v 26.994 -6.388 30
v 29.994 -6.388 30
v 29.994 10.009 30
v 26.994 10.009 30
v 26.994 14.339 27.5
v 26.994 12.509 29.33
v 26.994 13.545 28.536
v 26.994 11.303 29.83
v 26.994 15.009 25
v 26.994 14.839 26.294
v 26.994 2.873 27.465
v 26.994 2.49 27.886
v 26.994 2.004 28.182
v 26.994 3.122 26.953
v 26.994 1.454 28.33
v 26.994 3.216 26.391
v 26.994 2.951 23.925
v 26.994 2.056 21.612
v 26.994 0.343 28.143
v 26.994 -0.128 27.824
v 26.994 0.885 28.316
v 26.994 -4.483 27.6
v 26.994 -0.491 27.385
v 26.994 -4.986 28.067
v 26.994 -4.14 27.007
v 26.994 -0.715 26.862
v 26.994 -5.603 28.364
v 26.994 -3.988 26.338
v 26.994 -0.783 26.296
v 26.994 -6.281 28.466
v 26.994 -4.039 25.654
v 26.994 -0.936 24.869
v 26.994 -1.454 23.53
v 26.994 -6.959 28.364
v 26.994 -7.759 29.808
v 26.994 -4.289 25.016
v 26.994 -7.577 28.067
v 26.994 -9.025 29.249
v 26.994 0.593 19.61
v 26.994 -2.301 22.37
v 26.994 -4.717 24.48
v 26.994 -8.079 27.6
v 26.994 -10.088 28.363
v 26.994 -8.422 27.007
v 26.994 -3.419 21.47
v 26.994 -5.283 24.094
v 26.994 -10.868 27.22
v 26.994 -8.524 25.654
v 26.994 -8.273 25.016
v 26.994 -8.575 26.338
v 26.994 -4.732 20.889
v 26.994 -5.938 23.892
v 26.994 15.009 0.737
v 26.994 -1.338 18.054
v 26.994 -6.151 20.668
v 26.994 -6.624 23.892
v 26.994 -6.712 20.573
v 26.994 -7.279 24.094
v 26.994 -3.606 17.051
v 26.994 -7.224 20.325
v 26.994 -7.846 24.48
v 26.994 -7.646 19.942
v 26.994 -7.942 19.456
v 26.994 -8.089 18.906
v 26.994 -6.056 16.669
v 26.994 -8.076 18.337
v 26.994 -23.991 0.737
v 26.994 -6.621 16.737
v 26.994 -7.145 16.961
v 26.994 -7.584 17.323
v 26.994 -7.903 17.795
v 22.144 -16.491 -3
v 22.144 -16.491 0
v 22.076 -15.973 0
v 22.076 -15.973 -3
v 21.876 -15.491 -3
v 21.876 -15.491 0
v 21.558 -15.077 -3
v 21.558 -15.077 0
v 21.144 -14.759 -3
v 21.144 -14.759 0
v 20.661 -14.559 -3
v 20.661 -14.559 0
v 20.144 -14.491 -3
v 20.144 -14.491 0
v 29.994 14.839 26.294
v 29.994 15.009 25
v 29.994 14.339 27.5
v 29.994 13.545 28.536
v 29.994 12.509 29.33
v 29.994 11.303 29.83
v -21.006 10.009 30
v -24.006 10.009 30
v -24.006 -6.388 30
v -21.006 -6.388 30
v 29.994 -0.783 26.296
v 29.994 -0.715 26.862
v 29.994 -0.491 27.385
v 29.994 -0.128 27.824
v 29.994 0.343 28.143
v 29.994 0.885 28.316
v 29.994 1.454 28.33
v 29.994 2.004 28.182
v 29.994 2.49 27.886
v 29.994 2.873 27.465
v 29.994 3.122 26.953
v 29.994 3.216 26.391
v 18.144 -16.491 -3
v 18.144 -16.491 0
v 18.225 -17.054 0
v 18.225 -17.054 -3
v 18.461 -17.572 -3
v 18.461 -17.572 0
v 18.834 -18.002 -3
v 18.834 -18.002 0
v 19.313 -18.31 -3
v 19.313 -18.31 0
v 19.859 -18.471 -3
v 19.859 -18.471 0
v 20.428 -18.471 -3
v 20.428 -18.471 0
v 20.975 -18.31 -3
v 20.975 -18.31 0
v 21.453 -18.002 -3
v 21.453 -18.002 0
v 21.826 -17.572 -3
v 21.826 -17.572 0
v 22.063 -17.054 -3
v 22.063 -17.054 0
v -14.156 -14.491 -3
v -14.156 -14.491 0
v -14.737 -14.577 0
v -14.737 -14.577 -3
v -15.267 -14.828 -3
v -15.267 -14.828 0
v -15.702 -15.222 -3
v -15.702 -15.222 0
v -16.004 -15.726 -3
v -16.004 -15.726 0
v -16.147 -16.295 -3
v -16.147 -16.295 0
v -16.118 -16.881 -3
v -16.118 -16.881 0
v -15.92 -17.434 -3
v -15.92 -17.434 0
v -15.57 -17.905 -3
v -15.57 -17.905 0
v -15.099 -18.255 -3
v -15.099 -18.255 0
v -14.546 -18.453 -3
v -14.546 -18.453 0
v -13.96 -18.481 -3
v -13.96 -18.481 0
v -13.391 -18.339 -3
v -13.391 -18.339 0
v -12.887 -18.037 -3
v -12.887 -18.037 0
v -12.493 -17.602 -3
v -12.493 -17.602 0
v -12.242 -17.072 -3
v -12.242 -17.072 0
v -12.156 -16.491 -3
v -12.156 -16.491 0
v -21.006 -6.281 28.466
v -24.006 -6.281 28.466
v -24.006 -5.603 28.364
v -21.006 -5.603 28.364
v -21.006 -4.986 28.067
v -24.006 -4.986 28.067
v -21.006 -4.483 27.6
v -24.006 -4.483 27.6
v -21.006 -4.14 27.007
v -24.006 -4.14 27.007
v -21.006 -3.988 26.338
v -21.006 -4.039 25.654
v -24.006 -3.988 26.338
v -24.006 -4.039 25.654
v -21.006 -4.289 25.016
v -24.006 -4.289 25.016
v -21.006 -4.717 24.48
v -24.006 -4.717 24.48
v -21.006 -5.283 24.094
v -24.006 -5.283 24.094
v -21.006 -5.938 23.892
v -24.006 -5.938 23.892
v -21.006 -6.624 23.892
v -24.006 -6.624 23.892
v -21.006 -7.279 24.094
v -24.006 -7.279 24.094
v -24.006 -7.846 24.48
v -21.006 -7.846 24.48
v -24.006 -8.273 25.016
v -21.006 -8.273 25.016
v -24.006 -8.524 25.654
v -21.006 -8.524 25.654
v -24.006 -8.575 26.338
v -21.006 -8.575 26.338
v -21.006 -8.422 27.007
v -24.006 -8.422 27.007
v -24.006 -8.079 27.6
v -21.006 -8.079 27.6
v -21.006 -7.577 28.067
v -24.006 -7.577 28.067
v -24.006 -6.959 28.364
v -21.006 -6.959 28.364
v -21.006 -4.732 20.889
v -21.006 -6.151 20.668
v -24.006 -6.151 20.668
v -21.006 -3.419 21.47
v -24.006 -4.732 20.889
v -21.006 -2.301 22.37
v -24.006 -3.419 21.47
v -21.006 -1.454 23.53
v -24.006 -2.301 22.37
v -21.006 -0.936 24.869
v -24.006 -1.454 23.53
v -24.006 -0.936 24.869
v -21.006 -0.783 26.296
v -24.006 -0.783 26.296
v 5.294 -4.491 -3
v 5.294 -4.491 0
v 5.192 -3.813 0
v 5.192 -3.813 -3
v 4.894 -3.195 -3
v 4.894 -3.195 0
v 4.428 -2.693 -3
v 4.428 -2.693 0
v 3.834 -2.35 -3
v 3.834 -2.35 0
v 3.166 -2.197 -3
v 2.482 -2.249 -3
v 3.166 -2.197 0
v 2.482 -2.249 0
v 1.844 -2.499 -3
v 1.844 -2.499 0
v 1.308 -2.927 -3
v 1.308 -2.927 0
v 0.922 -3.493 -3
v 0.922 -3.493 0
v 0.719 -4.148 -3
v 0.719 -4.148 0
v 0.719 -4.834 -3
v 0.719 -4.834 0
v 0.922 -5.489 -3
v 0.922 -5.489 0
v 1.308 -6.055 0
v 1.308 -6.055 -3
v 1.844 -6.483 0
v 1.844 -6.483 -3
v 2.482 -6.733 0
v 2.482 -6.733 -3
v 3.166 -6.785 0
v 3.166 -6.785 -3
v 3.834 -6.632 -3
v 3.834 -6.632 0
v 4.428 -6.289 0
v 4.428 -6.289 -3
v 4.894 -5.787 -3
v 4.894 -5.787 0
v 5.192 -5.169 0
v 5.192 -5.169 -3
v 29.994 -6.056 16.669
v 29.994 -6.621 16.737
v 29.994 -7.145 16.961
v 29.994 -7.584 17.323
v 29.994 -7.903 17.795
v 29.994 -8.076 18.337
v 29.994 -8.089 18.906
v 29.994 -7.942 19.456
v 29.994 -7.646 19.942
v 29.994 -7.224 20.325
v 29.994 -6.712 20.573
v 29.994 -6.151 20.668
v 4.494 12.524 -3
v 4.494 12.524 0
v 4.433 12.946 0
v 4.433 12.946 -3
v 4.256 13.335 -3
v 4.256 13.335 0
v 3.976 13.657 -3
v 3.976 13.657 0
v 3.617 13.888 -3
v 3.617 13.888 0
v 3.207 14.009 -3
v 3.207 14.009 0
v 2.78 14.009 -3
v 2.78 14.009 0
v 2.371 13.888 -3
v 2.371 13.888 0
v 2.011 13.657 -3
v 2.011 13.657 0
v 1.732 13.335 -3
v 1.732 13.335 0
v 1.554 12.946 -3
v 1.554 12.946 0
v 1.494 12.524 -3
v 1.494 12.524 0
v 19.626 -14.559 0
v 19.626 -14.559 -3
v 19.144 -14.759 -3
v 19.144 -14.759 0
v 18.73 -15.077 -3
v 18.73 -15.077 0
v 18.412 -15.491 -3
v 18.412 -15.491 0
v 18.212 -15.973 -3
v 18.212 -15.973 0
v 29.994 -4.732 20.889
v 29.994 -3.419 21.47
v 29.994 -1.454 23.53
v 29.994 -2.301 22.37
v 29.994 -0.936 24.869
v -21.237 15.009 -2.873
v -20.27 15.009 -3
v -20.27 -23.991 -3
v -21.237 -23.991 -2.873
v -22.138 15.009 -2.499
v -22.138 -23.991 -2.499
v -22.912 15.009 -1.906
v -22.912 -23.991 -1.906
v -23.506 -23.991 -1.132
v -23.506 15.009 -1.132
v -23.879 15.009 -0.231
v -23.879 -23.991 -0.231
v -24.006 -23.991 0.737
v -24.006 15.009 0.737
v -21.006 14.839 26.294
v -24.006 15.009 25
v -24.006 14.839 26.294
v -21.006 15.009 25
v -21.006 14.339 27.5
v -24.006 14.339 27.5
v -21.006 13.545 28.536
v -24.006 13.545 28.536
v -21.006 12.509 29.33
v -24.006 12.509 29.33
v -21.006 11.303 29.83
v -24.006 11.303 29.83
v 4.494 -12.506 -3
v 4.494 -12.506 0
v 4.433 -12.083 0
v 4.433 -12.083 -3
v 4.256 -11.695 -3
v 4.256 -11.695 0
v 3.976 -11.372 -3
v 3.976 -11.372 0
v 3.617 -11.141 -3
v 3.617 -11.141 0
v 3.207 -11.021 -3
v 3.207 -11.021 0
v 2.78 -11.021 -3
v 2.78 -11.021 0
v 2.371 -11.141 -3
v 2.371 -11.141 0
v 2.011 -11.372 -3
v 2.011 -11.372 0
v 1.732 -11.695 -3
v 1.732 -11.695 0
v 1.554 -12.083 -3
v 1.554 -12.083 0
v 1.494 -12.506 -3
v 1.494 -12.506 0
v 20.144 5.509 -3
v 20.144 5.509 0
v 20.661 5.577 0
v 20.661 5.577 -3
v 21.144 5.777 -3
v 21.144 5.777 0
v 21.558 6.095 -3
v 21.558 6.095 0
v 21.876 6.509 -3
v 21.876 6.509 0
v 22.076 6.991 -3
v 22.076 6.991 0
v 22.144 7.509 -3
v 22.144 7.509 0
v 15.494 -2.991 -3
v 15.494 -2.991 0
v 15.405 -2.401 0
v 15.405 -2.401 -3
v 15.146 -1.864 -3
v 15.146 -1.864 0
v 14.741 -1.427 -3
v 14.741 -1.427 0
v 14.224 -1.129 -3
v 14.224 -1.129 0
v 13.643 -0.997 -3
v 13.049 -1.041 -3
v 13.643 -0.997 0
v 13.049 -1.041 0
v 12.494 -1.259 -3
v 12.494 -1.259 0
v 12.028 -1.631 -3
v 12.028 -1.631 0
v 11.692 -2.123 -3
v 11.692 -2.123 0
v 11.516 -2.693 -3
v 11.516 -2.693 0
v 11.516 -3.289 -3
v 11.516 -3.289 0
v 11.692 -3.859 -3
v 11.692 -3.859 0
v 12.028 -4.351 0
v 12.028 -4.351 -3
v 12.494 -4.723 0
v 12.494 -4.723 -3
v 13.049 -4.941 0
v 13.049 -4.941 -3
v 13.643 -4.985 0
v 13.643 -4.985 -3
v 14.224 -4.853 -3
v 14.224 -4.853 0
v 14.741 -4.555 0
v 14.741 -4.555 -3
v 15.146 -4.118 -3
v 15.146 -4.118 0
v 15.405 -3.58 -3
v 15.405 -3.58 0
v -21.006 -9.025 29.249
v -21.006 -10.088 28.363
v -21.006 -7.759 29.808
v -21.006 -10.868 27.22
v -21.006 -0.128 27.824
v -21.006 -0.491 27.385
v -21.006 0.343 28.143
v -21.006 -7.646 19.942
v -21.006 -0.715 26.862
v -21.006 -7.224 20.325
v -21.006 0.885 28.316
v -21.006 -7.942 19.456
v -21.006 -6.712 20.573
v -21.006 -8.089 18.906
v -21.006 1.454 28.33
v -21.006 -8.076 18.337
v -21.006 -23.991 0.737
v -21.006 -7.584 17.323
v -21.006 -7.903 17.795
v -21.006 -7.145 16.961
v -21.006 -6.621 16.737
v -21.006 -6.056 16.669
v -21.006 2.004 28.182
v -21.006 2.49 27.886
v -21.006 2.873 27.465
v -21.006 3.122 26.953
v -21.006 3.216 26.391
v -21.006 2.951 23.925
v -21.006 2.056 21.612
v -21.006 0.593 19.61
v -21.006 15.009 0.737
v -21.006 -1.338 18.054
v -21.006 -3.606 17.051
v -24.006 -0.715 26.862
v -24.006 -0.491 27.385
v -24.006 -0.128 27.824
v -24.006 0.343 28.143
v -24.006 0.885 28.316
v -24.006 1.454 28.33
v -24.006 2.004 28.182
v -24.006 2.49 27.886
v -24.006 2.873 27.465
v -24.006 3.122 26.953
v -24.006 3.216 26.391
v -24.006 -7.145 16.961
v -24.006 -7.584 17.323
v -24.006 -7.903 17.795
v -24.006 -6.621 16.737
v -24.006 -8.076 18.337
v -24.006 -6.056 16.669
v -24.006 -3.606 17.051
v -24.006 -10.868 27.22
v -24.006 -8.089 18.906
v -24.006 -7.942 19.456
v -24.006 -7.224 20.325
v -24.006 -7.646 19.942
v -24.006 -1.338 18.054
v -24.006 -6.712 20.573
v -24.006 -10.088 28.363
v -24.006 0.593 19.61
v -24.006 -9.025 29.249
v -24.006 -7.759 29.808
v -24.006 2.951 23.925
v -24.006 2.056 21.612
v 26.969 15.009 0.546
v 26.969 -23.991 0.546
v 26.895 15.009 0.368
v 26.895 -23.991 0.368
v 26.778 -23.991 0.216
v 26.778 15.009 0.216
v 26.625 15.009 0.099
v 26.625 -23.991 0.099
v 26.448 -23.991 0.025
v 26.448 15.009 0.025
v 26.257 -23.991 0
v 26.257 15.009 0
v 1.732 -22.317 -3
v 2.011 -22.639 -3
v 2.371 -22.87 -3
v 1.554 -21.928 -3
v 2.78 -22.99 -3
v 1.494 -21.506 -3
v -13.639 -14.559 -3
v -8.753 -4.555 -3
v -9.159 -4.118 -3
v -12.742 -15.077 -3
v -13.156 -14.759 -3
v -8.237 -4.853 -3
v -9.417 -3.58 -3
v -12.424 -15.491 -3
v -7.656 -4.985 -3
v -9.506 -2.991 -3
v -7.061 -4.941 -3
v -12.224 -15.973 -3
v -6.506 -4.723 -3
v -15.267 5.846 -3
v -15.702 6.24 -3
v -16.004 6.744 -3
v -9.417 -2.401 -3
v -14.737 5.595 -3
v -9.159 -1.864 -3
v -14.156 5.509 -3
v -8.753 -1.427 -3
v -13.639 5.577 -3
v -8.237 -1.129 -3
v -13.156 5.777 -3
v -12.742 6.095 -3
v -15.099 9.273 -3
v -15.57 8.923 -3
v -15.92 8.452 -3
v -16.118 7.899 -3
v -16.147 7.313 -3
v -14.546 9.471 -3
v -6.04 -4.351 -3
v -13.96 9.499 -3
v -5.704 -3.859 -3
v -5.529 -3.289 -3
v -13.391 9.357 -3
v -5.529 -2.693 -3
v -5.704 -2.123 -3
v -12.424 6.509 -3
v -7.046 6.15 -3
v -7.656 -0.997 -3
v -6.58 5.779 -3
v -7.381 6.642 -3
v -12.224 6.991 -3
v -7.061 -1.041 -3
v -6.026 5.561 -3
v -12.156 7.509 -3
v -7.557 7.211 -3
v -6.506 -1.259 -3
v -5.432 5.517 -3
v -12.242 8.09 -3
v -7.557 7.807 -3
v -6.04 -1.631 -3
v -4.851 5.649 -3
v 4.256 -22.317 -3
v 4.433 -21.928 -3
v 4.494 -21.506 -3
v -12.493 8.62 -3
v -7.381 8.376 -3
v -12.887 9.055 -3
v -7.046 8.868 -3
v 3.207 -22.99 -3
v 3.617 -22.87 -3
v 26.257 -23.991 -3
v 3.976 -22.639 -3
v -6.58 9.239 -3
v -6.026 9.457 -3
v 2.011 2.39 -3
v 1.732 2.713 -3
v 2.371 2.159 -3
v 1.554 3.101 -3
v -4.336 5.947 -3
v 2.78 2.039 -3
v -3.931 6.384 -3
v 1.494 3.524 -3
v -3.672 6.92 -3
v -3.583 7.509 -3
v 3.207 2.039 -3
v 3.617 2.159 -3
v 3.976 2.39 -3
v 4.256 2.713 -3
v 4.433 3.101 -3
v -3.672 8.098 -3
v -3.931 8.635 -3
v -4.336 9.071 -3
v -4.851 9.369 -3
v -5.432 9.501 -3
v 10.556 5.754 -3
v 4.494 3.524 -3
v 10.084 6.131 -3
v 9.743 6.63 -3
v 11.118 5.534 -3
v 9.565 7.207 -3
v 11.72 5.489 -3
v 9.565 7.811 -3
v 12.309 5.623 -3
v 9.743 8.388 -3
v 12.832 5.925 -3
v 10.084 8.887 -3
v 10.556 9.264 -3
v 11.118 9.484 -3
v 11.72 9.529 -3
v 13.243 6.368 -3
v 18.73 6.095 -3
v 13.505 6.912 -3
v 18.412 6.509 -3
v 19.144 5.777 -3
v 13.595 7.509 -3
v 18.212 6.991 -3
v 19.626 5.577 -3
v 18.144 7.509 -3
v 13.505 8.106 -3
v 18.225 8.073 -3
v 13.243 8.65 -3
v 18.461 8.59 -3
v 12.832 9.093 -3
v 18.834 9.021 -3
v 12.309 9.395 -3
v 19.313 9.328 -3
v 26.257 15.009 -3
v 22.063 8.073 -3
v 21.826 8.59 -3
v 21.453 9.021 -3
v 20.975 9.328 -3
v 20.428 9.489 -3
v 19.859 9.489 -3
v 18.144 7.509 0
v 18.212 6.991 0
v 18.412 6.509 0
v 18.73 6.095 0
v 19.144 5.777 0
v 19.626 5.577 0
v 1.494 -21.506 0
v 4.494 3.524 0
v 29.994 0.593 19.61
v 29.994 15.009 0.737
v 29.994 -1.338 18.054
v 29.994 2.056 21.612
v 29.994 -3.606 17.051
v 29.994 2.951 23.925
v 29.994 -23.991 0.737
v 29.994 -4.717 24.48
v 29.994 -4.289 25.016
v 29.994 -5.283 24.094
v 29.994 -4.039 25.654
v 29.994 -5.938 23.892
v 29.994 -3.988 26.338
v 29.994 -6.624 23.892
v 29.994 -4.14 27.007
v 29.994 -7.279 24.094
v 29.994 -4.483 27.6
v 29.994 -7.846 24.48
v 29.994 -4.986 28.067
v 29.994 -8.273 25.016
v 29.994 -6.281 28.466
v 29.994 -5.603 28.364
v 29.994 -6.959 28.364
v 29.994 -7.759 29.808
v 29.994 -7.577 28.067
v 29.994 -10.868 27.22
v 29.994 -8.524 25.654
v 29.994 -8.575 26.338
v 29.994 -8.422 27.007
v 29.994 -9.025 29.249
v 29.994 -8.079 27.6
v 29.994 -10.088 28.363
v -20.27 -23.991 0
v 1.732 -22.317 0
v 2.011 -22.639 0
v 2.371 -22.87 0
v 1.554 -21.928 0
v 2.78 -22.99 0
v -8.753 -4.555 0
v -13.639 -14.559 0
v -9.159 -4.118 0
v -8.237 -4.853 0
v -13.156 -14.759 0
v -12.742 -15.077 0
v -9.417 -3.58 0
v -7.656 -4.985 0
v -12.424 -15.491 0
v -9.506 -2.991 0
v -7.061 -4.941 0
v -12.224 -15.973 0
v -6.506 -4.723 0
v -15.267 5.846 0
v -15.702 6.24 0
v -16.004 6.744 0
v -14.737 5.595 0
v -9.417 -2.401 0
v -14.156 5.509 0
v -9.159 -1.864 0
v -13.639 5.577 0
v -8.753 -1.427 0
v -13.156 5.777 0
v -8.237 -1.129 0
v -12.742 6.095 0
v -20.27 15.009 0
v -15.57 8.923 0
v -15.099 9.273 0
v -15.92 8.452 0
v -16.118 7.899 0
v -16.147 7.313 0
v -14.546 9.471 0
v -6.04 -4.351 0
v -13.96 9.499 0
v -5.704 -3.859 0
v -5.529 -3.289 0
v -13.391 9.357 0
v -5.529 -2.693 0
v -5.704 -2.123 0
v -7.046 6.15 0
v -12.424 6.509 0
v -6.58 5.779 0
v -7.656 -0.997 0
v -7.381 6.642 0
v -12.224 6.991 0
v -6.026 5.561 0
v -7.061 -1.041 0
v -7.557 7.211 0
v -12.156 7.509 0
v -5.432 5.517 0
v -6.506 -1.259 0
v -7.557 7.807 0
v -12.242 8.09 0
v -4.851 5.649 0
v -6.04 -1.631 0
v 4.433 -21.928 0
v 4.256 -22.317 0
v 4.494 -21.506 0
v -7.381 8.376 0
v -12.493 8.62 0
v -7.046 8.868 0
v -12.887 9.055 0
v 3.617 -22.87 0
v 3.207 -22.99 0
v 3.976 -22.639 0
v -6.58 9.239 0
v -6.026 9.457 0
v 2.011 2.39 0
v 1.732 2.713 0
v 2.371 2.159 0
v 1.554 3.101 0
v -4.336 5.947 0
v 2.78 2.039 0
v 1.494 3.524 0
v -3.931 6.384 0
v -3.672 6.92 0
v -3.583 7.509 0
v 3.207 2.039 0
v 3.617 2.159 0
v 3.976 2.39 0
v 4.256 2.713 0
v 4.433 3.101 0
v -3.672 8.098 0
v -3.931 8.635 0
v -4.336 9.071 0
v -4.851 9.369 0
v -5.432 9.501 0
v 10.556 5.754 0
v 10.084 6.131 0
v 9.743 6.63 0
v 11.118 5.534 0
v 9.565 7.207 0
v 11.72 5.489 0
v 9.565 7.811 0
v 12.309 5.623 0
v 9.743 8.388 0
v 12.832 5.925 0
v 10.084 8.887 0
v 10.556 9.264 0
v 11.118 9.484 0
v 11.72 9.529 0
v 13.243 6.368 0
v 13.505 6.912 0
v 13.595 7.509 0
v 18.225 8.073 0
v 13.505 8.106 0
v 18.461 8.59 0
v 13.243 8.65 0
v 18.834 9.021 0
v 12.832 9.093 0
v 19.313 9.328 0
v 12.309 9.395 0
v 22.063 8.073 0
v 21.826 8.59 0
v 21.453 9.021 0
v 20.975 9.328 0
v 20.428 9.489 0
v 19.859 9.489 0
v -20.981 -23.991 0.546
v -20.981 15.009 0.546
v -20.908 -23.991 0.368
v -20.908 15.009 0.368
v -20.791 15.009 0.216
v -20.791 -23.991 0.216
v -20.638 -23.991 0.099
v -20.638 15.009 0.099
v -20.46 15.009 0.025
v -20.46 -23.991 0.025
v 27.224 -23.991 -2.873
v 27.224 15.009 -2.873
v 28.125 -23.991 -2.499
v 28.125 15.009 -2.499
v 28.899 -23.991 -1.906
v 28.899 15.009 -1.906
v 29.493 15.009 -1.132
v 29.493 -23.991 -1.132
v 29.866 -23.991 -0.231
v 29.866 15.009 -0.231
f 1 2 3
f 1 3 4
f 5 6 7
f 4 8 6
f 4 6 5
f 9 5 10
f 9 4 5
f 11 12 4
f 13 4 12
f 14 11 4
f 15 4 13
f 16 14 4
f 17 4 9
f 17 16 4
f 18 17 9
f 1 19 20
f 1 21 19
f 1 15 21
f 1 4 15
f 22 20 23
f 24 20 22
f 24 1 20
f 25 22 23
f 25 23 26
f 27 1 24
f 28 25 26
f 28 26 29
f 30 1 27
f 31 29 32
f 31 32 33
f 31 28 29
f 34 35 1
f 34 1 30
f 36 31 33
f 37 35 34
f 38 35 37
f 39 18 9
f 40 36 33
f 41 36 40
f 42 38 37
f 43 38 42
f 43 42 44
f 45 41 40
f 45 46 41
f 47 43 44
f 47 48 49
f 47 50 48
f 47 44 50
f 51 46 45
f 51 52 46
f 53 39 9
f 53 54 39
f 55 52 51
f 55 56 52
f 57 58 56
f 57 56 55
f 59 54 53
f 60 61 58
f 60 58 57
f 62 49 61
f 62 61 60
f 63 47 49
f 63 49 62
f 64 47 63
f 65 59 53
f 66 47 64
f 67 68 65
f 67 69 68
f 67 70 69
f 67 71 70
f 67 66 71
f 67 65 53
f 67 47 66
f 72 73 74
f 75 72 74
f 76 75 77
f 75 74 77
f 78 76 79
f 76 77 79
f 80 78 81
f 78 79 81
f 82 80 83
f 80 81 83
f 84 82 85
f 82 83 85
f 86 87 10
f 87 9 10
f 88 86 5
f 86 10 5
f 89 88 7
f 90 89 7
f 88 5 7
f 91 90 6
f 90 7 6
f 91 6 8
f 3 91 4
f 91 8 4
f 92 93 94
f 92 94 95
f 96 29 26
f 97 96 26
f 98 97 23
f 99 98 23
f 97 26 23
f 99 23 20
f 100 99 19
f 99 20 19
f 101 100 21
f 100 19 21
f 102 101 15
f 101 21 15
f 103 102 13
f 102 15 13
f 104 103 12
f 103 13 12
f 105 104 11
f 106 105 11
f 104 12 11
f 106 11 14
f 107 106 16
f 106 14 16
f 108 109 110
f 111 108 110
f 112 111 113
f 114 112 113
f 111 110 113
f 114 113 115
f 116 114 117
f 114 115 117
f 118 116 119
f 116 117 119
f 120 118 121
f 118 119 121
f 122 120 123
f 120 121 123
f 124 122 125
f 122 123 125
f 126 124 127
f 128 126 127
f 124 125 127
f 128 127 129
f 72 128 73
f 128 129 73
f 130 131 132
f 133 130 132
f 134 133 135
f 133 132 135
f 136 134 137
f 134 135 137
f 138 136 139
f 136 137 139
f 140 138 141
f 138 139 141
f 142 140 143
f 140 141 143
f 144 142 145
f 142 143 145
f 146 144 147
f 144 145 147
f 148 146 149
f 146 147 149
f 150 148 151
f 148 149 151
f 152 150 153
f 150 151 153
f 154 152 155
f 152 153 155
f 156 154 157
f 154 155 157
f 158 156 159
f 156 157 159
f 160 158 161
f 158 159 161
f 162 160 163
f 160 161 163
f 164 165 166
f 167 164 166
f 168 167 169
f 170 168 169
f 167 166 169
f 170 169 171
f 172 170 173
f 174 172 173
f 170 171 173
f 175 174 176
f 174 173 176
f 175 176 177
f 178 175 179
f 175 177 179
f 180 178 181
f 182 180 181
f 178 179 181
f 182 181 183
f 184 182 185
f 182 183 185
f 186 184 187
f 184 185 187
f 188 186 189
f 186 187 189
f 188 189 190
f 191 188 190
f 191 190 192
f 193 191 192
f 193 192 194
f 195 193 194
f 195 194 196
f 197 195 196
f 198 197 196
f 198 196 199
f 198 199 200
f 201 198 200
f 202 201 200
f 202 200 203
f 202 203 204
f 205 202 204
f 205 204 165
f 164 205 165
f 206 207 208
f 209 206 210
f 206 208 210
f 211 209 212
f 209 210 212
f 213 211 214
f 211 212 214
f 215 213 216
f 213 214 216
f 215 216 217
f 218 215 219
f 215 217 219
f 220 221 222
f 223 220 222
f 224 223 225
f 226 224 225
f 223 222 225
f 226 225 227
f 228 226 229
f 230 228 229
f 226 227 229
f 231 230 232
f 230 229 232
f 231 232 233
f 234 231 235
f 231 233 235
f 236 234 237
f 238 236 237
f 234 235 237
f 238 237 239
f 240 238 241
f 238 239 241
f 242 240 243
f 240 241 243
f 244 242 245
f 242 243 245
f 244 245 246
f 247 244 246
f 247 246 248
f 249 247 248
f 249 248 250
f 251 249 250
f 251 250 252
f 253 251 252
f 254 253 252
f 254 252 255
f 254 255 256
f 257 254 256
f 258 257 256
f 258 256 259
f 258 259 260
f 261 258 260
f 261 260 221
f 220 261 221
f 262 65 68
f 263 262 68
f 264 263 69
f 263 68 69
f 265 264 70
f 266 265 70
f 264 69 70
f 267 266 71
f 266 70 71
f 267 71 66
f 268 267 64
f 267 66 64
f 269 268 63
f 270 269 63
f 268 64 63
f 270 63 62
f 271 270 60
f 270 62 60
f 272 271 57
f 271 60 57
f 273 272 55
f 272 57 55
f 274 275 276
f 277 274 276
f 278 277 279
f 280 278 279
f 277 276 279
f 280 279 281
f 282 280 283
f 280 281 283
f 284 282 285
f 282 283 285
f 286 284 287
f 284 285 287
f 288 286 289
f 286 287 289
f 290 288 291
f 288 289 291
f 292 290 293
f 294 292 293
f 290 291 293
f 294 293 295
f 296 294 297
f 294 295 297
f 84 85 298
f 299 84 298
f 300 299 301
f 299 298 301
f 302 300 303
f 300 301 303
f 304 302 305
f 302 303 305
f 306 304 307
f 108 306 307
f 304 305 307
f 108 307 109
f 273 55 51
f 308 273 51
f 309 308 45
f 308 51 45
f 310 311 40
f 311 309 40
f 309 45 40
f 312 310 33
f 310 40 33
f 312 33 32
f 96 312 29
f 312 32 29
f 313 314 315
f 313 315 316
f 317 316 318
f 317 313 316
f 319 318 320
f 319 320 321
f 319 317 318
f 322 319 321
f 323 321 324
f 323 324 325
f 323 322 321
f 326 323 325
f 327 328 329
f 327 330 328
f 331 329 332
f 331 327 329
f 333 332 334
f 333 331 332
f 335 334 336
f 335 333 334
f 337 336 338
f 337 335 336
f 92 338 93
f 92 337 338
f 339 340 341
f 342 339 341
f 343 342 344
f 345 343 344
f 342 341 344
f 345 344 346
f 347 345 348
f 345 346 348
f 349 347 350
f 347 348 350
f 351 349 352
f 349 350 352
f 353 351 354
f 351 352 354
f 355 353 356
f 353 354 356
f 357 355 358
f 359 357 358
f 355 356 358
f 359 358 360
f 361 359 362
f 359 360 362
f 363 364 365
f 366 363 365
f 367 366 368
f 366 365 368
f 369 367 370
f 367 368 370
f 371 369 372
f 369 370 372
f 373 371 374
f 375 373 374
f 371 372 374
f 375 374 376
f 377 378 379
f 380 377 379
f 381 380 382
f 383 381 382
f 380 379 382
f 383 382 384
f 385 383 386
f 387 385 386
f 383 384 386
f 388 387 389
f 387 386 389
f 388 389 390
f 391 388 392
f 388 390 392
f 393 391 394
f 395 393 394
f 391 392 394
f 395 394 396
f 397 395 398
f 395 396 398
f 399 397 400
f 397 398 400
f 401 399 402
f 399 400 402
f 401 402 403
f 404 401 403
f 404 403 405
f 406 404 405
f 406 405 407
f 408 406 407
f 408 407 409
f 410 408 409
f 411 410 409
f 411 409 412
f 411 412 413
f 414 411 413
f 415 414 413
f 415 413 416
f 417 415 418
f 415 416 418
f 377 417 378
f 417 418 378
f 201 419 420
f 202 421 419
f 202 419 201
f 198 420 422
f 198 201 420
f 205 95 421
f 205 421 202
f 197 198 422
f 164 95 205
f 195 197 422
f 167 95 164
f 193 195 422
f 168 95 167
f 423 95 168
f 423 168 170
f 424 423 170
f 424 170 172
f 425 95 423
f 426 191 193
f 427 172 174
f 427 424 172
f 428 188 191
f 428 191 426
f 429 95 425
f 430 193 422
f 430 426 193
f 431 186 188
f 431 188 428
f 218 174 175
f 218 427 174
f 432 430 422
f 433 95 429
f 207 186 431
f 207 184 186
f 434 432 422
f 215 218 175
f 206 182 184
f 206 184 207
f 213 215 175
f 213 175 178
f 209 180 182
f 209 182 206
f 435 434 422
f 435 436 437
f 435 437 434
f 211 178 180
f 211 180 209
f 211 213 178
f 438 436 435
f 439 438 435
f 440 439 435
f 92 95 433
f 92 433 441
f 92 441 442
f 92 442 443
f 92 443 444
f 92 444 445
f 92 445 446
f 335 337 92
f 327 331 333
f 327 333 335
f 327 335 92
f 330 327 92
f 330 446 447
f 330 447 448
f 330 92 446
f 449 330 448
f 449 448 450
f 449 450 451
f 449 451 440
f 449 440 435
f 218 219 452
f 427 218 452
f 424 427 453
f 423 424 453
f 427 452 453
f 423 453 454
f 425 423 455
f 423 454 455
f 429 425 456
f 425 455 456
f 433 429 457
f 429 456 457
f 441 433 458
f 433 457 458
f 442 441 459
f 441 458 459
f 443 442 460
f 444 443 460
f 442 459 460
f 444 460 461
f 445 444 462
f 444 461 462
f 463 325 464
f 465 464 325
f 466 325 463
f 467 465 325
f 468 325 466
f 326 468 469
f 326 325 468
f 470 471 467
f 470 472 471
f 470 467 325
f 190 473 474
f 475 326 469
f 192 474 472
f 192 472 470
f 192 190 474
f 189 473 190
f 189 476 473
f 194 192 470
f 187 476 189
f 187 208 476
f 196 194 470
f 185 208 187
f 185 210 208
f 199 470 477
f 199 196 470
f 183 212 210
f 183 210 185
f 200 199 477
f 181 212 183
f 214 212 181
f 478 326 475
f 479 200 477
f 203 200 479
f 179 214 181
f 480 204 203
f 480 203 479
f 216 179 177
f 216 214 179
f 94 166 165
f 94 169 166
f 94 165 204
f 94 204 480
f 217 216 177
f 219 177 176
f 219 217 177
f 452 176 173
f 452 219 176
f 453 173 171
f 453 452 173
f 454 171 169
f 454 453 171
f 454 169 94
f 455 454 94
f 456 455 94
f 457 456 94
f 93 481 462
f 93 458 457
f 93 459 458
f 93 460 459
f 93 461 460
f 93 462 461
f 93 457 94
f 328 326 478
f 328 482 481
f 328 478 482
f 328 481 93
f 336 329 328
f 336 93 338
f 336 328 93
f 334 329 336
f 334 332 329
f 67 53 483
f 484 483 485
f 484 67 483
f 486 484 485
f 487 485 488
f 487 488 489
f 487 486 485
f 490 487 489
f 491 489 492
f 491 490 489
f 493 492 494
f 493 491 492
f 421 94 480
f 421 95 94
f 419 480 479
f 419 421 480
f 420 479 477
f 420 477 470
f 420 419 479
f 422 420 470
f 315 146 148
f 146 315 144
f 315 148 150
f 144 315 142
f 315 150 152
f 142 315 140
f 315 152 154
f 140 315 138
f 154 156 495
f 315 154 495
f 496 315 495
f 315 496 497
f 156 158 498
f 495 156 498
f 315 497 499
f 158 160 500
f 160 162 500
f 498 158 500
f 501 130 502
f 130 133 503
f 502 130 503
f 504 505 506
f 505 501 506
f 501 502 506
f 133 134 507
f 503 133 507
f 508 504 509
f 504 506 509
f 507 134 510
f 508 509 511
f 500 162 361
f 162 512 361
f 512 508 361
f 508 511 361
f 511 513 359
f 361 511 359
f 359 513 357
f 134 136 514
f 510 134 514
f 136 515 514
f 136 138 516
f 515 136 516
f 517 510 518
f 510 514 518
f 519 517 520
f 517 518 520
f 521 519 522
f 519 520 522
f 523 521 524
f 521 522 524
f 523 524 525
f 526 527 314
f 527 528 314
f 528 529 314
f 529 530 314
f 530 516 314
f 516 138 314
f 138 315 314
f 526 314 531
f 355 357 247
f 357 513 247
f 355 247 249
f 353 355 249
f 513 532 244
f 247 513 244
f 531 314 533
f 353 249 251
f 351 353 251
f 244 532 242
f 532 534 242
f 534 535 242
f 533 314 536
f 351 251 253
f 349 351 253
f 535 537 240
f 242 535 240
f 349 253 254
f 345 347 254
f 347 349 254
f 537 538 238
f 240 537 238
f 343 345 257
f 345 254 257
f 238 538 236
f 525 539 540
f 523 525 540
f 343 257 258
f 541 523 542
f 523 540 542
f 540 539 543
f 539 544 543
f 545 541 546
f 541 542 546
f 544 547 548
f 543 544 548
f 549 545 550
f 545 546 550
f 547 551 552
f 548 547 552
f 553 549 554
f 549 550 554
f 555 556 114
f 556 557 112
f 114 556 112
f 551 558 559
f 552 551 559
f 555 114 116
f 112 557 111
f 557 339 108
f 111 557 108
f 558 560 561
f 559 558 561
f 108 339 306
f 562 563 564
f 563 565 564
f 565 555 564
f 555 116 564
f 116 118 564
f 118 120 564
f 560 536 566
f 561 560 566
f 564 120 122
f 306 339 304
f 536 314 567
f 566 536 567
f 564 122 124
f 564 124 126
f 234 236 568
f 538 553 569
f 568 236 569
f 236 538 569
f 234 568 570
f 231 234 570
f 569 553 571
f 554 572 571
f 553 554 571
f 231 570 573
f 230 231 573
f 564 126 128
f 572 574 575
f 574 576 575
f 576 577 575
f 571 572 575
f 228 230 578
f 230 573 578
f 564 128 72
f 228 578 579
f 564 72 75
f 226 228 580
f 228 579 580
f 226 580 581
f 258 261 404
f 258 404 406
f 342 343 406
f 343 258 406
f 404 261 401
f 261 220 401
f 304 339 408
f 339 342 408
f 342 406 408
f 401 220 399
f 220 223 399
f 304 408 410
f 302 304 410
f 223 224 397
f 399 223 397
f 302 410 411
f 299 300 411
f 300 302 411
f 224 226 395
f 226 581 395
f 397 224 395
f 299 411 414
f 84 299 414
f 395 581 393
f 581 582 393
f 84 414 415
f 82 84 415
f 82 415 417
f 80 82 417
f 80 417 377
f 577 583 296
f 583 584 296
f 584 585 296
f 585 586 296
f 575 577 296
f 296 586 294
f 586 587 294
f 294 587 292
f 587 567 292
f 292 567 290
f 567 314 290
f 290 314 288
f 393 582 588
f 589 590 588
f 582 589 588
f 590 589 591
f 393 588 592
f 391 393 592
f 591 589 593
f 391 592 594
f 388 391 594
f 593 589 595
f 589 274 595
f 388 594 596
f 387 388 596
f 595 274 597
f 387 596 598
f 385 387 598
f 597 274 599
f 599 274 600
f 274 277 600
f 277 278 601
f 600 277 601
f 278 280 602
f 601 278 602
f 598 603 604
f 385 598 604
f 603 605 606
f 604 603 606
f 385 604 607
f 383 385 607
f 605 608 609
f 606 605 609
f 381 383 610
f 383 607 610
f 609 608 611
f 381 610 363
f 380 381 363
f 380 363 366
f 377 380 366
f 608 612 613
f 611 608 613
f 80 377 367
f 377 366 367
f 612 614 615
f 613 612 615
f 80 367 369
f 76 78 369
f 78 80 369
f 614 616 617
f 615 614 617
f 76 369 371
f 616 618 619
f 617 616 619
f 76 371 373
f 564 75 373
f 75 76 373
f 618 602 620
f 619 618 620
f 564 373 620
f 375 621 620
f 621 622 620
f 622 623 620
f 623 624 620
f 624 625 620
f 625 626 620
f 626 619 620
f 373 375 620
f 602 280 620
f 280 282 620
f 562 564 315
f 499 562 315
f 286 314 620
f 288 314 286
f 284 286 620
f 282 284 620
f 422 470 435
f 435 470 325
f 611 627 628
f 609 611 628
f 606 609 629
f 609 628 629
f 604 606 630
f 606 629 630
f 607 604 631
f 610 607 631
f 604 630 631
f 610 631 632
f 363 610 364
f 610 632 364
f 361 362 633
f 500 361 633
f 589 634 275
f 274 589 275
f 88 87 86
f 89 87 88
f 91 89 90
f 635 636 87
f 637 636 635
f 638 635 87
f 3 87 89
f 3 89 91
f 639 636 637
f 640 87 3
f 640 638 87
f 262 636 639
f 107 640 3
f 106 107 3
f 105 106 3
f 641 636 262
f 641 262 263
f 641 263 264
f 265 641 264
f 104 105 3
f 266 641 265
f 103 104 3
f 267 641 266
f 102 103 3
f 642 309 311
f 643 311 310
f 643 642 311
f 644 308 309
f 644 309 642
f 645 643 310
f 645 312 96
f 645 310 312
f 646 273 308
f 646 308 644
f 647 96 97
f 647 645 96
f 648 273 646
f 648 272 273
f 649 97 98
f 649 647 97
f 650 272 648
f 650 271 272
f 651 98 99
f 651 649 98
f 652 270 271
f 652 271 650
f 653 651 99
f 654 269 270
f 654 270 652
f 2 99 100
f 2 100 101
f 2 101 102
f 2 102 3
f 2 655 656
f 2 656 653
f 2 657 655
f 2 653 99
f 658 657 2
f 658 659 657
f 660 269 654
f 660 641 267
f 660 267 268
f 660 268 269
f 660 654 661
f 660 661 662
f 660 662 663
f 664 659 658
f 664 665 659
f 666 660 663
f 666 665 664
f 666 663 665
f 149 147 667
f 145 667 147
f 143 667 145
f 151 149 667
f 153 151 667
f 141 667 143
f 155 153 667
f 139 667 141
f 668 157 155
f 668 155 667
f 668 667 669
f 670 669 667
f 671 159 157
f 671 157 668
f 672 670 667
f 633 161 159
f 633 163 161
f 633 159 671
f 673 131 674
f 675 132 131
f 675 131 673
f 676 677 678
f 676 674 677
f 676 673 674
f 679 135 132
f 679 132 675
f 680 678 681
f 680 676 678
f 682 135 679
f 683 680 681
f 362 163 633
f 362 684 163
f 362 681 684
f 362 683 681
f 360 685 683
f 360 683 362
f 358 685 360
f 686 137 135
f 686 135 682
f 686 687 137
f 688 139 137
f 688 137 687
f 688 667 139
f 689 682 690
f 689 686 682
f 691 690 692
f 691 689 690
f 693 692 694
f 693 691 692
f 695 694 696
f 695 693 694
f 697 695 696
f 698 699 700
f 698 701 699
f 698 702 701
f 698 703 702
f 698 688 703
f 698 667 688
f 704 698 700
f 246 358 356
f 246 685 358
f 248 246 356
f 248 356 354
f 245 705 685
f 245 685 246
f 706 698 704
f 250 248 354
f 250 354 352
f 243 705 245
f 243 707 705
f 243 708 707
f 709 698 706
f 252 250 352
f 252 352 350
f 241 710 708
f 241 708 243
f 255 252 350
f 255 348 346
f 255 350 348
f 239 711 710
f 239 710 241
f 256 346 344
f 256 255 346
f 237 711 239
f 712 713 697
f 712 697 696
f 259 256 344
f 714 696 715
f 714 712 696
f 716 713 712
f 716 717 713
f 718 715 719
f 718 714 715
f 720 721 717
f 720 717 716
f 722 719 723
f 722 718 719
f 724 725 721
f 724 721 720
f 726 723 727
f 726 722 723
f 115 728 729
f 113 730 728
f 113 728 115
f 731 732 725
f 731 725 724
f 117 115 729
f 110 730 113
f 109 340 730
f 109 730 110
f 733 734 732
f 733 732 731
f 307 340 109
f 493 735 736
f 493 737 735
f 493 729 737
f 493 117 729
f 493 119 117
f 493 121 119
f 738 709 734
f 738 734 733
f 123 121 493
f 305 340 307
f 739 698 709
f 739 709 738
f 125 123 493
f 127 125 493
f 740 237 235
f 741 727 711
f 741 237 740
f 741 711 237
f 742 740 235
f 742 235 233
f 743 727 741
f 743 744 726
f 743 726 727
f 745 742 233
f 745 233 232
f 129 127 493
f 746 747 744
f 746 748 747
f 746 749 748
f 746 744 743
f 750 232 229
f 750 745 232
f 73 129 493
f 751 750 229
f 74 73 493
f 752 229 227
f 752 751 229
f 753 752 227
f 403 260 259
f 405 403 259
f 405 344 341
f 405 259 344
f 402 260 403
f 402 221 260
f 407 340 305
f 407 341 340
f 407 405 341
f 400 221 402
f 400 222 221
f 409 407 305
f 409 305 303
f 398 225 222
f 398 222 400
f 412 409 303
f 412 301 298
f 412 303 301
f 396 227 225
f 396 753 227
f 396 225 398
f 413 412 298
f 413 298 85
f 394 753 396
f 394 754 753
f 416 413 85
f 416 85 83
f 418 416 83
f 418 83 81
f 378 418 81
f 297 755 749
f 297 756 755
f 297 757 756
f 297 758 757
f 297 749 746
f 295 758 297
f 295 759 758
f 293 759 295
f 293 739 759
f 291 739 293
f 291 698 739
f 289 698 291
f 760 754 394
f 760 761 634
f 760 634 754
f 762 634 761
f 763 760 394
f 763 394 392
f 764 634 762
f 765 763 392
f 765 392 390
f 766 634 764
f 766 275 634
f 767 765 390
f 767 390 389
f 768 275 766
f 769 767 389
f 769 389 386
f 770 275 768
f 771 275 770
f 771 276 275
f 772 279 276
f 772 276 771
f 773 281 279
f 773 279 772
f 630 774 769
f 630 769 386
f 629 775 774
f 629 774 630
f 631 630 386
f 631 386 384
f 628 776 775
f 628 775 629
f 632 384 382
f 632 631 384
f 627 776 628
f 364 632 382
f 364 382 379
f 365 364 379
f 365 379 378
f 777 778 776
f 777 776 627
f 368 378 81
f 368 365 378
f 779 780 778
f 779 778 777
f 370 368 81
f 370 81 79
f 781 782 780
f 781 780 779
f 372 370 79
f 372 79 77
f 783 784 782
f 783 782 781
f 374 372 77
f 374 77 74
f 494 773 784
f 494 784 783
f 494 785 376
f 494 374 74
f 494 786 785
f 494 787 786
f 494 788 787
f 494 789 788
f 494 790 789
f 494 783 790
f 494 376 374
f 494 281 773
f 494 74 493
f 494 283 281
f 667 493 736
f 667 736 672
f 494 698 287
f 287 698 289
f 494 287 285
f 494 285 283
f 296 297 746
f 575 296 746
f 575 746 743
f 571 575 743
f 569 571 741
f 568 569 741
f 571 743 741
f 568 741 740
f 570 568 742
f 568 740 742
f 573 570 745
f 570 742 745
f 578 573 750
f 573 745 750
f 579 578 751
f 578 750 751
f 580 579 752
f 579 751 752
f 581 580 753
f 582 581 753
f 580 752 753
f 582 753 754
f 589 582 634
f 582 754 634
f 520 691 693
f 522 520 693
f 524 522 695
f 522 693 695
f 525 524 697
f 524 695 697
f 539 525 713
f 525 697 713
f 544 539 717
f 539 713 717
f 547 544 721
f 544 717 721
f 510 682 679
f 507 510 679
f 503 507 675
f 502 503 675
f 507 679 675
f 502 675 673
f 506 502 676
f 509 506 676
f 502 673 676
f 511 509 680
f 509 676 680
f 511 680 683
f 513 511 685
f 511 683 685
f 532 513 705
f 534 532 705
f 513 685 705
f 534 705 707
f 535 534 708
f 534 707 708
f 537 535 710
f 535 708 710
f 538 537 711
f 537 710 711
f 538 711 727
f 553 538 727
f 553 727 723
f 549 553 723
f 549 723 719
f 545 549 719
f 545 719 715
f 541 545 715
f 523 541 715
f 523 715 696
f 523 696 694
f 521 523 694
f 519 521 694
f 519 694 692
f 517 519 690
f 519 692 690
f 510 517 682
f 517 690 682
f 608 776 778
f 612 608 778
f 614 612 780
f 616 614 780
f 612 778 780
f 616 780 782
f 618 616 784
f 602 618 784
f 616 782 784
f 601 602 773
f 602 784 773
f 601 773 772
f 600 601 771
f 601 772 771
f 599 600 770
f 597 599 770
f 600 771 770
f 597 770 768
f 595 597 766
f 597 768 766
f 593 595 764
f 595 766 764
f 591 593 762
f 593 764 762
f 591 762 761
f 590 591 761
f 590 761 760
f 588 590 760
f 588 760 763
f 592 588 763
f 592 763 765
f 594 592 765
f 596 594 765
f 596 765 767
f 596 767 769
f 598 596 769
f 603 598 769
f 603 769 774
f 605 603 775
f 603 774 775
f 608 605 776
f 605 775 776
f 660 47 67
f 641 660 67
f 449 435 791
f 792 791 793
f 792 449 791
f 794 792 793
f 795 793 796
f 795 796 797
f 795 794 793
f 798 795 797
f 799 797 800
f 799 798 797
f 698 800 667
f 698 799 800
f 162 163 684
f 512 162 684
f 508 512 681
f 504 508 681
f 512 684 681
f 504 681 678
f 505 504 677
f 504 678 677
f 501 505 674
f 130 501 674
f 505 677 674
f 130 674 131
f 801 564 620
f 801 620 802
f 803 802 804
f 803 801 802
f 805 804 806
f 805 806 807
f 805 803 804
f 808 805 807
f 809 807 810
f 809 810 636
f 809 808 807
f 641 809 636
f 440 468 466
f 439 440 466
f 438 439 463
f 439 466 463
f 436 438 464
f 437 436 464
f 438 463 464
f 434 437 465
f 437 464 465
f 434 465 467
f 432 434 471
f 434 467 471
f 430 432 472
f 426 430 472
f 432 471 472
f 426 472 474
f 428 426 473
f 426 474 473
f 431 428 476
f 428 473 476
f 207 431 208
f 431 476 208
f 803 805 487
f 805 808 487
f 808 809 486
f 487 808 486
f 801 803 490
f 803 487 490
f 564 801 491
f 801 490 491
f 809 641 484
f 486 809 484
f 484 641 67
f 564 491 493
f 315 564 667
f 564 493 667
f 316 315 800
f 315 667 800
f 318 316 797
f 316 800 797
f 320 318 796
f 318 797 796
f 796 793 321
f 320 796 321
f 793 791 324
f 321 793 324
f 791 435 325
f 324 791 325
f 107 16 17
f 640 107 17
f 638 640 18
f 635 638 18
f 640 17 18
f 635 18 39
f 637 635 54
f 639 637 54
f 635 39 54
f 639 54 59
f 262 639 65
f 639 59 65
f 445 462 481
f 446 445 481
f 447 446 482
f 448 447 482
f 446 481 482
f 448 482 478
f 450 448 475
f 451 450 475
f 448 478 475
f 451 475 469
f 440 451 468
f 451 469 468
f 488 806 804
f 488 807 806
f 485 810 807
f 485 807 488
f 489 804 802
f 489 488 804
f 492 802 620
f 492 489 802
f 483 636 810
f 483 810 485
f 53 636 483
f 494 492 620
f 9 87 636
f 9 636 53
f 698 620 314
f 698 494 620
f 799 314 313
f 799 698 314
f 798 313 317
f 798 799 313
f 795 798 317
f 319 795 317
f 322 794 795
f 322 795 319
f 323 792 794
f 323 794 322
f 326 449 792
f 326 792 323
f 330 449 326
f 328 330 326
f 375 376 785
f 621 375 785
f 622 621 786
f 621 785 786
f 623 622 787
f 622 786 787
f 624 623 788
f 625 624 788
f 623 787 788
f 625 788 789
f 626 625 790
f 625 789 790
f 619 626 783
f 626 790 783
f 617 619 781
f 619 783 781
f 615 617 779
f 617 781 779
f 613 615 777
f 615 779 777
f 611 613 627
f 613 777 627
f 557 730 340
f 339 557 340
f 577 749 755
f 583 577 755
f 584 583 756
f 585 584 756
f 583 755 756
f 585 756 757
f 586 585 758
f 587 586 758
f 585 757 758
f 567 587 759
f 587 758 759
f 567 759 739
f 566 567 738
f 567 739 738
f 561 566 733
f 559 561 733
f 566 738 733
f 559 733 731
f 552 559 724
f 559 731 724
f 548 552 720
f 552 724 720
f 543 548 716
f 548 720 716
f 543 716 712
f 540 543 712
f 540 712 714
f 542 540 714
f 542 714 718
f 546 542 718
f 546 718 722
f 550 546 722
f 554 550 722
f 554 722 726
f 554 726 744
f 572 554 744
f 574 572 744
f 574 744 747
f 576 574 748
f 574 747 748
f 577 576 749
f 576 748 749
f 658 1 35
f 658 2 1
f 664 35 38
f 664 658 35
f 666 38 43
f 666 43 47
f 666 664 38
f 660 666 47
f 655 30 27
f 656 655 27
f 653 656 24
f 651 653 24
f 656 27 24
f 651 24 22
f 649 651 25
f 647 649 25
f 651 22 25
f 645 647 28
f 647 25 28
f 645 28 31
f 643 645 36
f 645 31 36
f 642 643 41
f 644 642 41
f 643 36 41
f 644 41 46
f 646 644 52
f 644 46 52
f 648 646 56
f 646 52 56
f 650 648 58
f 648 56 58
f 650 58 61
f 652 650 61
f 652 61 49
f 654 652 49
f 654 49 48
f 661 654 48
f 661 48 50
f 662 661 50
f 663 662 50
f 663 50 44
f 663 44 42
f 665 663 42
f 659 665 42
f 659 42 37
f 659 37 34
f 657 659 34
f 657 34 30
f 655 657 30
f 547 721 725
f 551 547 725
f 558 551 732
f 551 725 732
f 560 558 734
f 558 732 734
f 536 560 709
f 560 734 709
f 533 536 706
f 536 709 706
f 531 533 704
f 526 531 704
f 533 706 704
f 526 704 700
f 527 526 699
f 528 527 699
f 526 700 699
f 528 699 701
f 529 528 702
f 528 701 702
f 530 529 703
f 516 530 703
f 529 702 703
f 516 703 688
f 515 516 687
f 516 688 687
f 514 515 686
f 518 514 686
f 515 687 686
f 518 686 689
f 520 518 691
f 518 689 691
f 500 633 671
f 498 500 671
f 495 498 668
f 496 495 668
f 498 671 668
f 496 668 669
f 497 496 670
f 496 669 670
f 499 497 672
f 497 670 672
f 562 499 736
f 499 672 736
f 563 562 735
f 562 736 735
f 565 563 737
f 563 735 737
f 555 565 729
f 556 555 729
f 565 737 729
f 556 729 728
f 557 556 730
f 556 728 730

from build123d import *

# Parameters (mm, degrees)
ESBO_O1_W                        = 48
ESBO_O1_H                        = 39
FLANGE_BASE1_DEPTH               = 3
ESBO_O6_R                        = 2.3
CORTE_EXTRUS_O1_DEPTH            = 10
ARESTA_FLANGE1_STRIP_W           = 13.4732
ARESTA_FLANGE1_STRIP_H           = 3
ARESTA_FLANGE1_STRIP_CUT_DEPTH   = 39
ARESTA_FLANGE1_STRIP_2_W         = 13.4732
ARESTA_FLANGE1_STRIP_2_H         = 3
ARESTA_FLANGE1_STRIP_CUT_2_DEPTH = 39
ARESTA_FLANGE1_DEPTH             = 39
ARESTA_FLANGE1_BEND_DEPTH        = 39
ESBO_O13_R                       = 2.3
CORTE_EXTRUS_O2_DEPTH            = 70
FILETE1_R                        = 5
ESBO_O14_R                       = 1.997873176
ESBO_O14_R_2                     = 2.026064888
ESBO_O14_R_3                     = 2
CORTE_EXTRUS_O4_DEPTH            = 3


# Sheet-metal steps are written as plain solids
with BuildPart() as part:
    # Esboço1 → Flange-base1 (new body)
    with BuildSketch(Plane.XY):
        with Locations((2.993735783, -4.490936556)):
            Rectangle(ESBO_O1_W, ESBO_O1_H)
    extrude(amount=-FLANGE_BASE1_DEPTH)

    # Esboço6 → Corte-extrusão1 (cut)
    with BuildSketch(Plane.XY):
        with BuildLine():
            Line((-14.156264217, 5.509063444), (-14.156264217, 7.509063444))
            Line((-14.156264217, 7.509063444), (-12.156264217, 7.509063444))
            ThreePointArc((-12.156264217, 7.509063444), (-15.570477779, 8.923277006), (-14.156264217, 5.509063444))
        make_face()
        with BuildLine():
            Line((-12.156264217, 7.509063444), (-14.156264217, 7.509063444))
            Line((-14.156264217, 7.509063444), (-14.156264217, 5.509063444))
            ThreePointArc((-14.156264217, 5.509063444), (-12.742050654, 6.094849882), (-12.156264217, 7.509063444))
        make_face()
        with BuildLine():
            ThreePointArc((-12.156264217, -16.490936556), (-12.742050654, -15.076722994), (-14.156264217, -14.490936556))
            Line((-14.156264217, -14.490936556), (-14.156264217, -16.490936556))
            Line((-14.156264217, -16.490936556), (-12.156264217, -16.490936556))
        make_face()
        with BuildLine():
            Line((-14.156264217, -16.490936556), (-14.156264217, -14.490936556))
            ThreePointArc((-14.156264217, -14.490936556), (-15.570477779, -17.905150118), (-12.156264217, -16.490936556))
            Line((-12.156264217, -16.490936556), (-14.156264217, -16.490936556))
        make_face()
        with Locations((2.993735783, -4.490936556)):
            Circle(ESBO_O6_R)
        with BuildLine():
            Line((4.493735783, 7.509063444), (1.493735783, 7.509063444))
            Line((1.493735783, 7.509063444), (1.493735783, 3.523823043))
            ThreePointArc((1.493735783, 3.523823043), (2.993735783, 2.023823043), (4.493735783, 3.523823043))
            Line((4.493735783, 3.523823043), (4.493735783, 7.509063444))
        make_face()
        with BuildLine():
            Line((1.493735783, 12.523823043), (1.493735783, 7.509063444))
            Line((1.493735783, 7.509063444), (4.493735783, 7.509063444))
            Line((4.493735783, 7.509063444), (4.493735783, 12.523823043))
            ThreePointArc((4.493735783, 12.523823043), (2.993735783, 14.023823043), (1.493735783, 12.523823043))
        make_face()
        with BuildLine():
            Line((1.493735783, -12.505696155), (1.493735783, -16.490936556))
            Line((1.493735783, -16.490936556), (4.493735783, -16.490936556))
            Line((4.493735783, -16.490936556), (4.493735783, -12.505696155))
            ThreePointArc((4.493735783, -12.505696155), (2.993735783, -11.005696155), (1.493735783, -12.505696155))
        make_face()
        with BuildLine():
            Line((4.493735783, -16.490936556), (1.493735783, -16.490936556))
            Line((1.493735783, -16.490936556), (1.493735783, -21.505696155))
            ThreePointArc((1.493735783, -21.505696155), (2.993735783, -23.005696155), (4.493735783, -21.505696155))
            Line((4.493735783, -21.505696155), (4.493735783, -16.490936556))
        make_face()
        with BuildLine():
            ThreePointArc((22.143735783, -16.490936556), (21.557949346, -15.076722994), (20.143735783, -14.490936556))
            Line((20.143735783, -14.490936556), (20.143735783, -16.490936556))
            Line((20.143735783, -16.490936556), (18.143735783, -16.490936556))
            ThreePointArc((18.143735783, -16.490936556), (20.143735783, -18.490936556), (22.143735783, -16.490936556))
        make_face()
        with BuildLine():
            Line((20.143735783, -16.490936556), (20.143735783, -14.490936556))
            ThreePointArc((20.143735783, -14.490936556), (18.729522221, -15.076722994), (18.143735783, -16.490936556))
            Line((18.143735783, -16.490936556), (20.143735783, -16.490936556))
        make_face()
        with BuildLine():
            ThreePointArc((22.143735783, 7.509063444), (20.143735783, 9.509063444), (18.143735783, 7.509063444))
            Line((18.143735783, 7.509063444), (20.143735783, 7.509063444))
            Line((20.143735783, 7.509063444), (20.143735783, 5.509063444))
            ThreePointArc((20.143735783, 5.509063444), (21.557949346, 6.094849882), (22.143735783, 7.509063444))
        make_face()
        with BuildLine():
            Line((20.143735783, 7.509063444), (18.143735783, 7.509063444))
            ThreePointArc((18.143735783, 7.509063444), (18.729522221, 6.094849882), (20.143735783, 5.509063444))
            Line((20.143735783, 5.509063444), (20.143735783, 7.509063444))
        make_face()
    extrude(amount=-CORTE_EXTRUS_O1_DEPTH, mode=Mode.SUBTRACT)

    # Aresta-Flange1 strip (across the edge) → Aresta-Flange1 strip cut (cut)
    with BuildSketch(Plane(origin=(26.993735783, -23.990936556, 0), x_dir=(-1, 0, 0), z_dir=(0, 1, 0))):
        with Locations((-6, -1.5)):
            Rectangle(ARESTA_FLANGE1_STRIP_W, ARESTA_FLANGE1_STRIP_H)
    extrude(amount=ARESTA_FLANGE1_STRIP_CUT_DEPTH, mode=Mode.SUBTRACT)

    # Aresta-Flange1 strip 2 (across the edge) → Aresta-Flange1 strip cut 2 (cut)
    with BuildSketch(Plane(origin=(-21.006264217, 15.009063444, 0), x_dir=(1, 0, 0), z_dir=(0, -1, 0))):
        with Locations((-6, -1.5)):
            Rectangle(ARESTA_FLANGE1_STRIP_2_W, ARESTA_FLANGE1_STRIP_2_H)
    extrude(amount=ARESTA_FLANGE1_STRIP_CUT_2_DEPTH, mode=Mode.SUBTRACT)

    # Aresta-Flange1 section (across the edge) → Aresta-Flange1 (add)
    with BuildSketch(Plane(origin=(26.993735783, -23.990936556, 0), x_dir=(-1, 0, 0), z_dir=(0, 1, 0))):
        with BuildLine():
            Line((-3, 0.7366), (-3, 30))
            Line((-3, 30), (0, 30))
            Line((0, 30), (0, 0.7366))
            ThreePointArc((0, 0.7366), (0.215745145, 0.215745145), (0.7366, 0))
            Line((0.7366, 0), (0.7366, -3))
            ThreePointArc((0.7366, -3), (-1.905575199, -1.905575199), (-3, 0.7366))
        make_face()
    extrude(amount=ARESTA_FLANGE1_DEPTH)

    # Aresta-Flange1 section 2 (across the edge) → Aresta-Flange1 bend (add)
    with BuildSketch(Plane(origin=(-21.006264217, 15.009063444, 0), x_dir=(1, 0, 0), z_dir=(0, -1, 0))):
        with BuildLine():
            Line((-3, 0.7366), (-3, 30))
            Line((-3, 30), (0, 30))
            Line((0, 30), (0, 0.7366))
            ThreePointArc((0, 0.7366), (0.215745145, 0.215745145), (0.7366, 0))
            Line((0.7366, 0), (0.7366, -3))
            ThreePointArc((0.7366, -3), (-1.905575199, -1.905575199), (-3, 0.7366))
        make_face()
    extrude(amount=ARESTA_FLANGE1_BEND_DEPTH)

    # Esboço13 → Corte-extrusão2 (cut)
    with BuildSketch(Plane.ZY.offset(24.006264217)):
        with Locations((26.166238029, -6.281221748)):
            Circle(ESBO_O13_R)
        Polygon((0.7366, -23.990936556), (30, -23.990936556), (30, -9.490936556), align=None)
        with BuildLine():
            ThreePointArc((26.391219924, 3.216113833), (19.60969386, 0.593494869), (16.668902447, -6.056239853))
            ThreePointArc((16.668902447, -6.056239853), (18.620976907, -8.103043532), (20.667780587, -6.150969072))
            ThreePointArc((20.667780587, -6.150969072), (22.370344036, -2.301122654), (26.296490705, -0.782764306))
            ThreePointArc((26.296490705, -0.782764306), (28.343294384, 1.169310154), (26.391219924, 3.216113833))
        make_face()
    extrude(amount=-CORTE_EXTRUS_O2_DEPTH, mode=Mode.SUBTRACT)

    # Filete1
    filete1_edges = [part.edges().sort_by_distance(p)[0] for p in [
        (28.493735783, 15.009063444, 30),
        (-22.506264217, 15.009063444, 30),
        (-22.506264217, -9.490936556, 30),
        (28.493735783, -9.490936556, 30),
    ]]
    fillet(filete1_edges, radius=FILETE1_R)

    # Esboço14 → Corte-extrusão4 (cut)
    with BuildSketch(Plane.XY):
        with Locations((-5.581264217, 7.509063444)):
            Circle(ESBO_O14_R)
        with Locations((11.568735783, 7.509063444)):
            Circle(ESBO_O14_R_2)
        with Locations((13.493735783, -2.990936556)):
            Circle(ESBO_O14_R_3)
        with Locations(Location((-7.506264217, -2.990936556, 0), (0, 0, 180))):
            Circle(ESBO_O14_R_3)
    extrude(amount=-CORTE_EXTRUS_O4_DEPTH, mode=Mode.SUBTRACT)


solid = part.part
